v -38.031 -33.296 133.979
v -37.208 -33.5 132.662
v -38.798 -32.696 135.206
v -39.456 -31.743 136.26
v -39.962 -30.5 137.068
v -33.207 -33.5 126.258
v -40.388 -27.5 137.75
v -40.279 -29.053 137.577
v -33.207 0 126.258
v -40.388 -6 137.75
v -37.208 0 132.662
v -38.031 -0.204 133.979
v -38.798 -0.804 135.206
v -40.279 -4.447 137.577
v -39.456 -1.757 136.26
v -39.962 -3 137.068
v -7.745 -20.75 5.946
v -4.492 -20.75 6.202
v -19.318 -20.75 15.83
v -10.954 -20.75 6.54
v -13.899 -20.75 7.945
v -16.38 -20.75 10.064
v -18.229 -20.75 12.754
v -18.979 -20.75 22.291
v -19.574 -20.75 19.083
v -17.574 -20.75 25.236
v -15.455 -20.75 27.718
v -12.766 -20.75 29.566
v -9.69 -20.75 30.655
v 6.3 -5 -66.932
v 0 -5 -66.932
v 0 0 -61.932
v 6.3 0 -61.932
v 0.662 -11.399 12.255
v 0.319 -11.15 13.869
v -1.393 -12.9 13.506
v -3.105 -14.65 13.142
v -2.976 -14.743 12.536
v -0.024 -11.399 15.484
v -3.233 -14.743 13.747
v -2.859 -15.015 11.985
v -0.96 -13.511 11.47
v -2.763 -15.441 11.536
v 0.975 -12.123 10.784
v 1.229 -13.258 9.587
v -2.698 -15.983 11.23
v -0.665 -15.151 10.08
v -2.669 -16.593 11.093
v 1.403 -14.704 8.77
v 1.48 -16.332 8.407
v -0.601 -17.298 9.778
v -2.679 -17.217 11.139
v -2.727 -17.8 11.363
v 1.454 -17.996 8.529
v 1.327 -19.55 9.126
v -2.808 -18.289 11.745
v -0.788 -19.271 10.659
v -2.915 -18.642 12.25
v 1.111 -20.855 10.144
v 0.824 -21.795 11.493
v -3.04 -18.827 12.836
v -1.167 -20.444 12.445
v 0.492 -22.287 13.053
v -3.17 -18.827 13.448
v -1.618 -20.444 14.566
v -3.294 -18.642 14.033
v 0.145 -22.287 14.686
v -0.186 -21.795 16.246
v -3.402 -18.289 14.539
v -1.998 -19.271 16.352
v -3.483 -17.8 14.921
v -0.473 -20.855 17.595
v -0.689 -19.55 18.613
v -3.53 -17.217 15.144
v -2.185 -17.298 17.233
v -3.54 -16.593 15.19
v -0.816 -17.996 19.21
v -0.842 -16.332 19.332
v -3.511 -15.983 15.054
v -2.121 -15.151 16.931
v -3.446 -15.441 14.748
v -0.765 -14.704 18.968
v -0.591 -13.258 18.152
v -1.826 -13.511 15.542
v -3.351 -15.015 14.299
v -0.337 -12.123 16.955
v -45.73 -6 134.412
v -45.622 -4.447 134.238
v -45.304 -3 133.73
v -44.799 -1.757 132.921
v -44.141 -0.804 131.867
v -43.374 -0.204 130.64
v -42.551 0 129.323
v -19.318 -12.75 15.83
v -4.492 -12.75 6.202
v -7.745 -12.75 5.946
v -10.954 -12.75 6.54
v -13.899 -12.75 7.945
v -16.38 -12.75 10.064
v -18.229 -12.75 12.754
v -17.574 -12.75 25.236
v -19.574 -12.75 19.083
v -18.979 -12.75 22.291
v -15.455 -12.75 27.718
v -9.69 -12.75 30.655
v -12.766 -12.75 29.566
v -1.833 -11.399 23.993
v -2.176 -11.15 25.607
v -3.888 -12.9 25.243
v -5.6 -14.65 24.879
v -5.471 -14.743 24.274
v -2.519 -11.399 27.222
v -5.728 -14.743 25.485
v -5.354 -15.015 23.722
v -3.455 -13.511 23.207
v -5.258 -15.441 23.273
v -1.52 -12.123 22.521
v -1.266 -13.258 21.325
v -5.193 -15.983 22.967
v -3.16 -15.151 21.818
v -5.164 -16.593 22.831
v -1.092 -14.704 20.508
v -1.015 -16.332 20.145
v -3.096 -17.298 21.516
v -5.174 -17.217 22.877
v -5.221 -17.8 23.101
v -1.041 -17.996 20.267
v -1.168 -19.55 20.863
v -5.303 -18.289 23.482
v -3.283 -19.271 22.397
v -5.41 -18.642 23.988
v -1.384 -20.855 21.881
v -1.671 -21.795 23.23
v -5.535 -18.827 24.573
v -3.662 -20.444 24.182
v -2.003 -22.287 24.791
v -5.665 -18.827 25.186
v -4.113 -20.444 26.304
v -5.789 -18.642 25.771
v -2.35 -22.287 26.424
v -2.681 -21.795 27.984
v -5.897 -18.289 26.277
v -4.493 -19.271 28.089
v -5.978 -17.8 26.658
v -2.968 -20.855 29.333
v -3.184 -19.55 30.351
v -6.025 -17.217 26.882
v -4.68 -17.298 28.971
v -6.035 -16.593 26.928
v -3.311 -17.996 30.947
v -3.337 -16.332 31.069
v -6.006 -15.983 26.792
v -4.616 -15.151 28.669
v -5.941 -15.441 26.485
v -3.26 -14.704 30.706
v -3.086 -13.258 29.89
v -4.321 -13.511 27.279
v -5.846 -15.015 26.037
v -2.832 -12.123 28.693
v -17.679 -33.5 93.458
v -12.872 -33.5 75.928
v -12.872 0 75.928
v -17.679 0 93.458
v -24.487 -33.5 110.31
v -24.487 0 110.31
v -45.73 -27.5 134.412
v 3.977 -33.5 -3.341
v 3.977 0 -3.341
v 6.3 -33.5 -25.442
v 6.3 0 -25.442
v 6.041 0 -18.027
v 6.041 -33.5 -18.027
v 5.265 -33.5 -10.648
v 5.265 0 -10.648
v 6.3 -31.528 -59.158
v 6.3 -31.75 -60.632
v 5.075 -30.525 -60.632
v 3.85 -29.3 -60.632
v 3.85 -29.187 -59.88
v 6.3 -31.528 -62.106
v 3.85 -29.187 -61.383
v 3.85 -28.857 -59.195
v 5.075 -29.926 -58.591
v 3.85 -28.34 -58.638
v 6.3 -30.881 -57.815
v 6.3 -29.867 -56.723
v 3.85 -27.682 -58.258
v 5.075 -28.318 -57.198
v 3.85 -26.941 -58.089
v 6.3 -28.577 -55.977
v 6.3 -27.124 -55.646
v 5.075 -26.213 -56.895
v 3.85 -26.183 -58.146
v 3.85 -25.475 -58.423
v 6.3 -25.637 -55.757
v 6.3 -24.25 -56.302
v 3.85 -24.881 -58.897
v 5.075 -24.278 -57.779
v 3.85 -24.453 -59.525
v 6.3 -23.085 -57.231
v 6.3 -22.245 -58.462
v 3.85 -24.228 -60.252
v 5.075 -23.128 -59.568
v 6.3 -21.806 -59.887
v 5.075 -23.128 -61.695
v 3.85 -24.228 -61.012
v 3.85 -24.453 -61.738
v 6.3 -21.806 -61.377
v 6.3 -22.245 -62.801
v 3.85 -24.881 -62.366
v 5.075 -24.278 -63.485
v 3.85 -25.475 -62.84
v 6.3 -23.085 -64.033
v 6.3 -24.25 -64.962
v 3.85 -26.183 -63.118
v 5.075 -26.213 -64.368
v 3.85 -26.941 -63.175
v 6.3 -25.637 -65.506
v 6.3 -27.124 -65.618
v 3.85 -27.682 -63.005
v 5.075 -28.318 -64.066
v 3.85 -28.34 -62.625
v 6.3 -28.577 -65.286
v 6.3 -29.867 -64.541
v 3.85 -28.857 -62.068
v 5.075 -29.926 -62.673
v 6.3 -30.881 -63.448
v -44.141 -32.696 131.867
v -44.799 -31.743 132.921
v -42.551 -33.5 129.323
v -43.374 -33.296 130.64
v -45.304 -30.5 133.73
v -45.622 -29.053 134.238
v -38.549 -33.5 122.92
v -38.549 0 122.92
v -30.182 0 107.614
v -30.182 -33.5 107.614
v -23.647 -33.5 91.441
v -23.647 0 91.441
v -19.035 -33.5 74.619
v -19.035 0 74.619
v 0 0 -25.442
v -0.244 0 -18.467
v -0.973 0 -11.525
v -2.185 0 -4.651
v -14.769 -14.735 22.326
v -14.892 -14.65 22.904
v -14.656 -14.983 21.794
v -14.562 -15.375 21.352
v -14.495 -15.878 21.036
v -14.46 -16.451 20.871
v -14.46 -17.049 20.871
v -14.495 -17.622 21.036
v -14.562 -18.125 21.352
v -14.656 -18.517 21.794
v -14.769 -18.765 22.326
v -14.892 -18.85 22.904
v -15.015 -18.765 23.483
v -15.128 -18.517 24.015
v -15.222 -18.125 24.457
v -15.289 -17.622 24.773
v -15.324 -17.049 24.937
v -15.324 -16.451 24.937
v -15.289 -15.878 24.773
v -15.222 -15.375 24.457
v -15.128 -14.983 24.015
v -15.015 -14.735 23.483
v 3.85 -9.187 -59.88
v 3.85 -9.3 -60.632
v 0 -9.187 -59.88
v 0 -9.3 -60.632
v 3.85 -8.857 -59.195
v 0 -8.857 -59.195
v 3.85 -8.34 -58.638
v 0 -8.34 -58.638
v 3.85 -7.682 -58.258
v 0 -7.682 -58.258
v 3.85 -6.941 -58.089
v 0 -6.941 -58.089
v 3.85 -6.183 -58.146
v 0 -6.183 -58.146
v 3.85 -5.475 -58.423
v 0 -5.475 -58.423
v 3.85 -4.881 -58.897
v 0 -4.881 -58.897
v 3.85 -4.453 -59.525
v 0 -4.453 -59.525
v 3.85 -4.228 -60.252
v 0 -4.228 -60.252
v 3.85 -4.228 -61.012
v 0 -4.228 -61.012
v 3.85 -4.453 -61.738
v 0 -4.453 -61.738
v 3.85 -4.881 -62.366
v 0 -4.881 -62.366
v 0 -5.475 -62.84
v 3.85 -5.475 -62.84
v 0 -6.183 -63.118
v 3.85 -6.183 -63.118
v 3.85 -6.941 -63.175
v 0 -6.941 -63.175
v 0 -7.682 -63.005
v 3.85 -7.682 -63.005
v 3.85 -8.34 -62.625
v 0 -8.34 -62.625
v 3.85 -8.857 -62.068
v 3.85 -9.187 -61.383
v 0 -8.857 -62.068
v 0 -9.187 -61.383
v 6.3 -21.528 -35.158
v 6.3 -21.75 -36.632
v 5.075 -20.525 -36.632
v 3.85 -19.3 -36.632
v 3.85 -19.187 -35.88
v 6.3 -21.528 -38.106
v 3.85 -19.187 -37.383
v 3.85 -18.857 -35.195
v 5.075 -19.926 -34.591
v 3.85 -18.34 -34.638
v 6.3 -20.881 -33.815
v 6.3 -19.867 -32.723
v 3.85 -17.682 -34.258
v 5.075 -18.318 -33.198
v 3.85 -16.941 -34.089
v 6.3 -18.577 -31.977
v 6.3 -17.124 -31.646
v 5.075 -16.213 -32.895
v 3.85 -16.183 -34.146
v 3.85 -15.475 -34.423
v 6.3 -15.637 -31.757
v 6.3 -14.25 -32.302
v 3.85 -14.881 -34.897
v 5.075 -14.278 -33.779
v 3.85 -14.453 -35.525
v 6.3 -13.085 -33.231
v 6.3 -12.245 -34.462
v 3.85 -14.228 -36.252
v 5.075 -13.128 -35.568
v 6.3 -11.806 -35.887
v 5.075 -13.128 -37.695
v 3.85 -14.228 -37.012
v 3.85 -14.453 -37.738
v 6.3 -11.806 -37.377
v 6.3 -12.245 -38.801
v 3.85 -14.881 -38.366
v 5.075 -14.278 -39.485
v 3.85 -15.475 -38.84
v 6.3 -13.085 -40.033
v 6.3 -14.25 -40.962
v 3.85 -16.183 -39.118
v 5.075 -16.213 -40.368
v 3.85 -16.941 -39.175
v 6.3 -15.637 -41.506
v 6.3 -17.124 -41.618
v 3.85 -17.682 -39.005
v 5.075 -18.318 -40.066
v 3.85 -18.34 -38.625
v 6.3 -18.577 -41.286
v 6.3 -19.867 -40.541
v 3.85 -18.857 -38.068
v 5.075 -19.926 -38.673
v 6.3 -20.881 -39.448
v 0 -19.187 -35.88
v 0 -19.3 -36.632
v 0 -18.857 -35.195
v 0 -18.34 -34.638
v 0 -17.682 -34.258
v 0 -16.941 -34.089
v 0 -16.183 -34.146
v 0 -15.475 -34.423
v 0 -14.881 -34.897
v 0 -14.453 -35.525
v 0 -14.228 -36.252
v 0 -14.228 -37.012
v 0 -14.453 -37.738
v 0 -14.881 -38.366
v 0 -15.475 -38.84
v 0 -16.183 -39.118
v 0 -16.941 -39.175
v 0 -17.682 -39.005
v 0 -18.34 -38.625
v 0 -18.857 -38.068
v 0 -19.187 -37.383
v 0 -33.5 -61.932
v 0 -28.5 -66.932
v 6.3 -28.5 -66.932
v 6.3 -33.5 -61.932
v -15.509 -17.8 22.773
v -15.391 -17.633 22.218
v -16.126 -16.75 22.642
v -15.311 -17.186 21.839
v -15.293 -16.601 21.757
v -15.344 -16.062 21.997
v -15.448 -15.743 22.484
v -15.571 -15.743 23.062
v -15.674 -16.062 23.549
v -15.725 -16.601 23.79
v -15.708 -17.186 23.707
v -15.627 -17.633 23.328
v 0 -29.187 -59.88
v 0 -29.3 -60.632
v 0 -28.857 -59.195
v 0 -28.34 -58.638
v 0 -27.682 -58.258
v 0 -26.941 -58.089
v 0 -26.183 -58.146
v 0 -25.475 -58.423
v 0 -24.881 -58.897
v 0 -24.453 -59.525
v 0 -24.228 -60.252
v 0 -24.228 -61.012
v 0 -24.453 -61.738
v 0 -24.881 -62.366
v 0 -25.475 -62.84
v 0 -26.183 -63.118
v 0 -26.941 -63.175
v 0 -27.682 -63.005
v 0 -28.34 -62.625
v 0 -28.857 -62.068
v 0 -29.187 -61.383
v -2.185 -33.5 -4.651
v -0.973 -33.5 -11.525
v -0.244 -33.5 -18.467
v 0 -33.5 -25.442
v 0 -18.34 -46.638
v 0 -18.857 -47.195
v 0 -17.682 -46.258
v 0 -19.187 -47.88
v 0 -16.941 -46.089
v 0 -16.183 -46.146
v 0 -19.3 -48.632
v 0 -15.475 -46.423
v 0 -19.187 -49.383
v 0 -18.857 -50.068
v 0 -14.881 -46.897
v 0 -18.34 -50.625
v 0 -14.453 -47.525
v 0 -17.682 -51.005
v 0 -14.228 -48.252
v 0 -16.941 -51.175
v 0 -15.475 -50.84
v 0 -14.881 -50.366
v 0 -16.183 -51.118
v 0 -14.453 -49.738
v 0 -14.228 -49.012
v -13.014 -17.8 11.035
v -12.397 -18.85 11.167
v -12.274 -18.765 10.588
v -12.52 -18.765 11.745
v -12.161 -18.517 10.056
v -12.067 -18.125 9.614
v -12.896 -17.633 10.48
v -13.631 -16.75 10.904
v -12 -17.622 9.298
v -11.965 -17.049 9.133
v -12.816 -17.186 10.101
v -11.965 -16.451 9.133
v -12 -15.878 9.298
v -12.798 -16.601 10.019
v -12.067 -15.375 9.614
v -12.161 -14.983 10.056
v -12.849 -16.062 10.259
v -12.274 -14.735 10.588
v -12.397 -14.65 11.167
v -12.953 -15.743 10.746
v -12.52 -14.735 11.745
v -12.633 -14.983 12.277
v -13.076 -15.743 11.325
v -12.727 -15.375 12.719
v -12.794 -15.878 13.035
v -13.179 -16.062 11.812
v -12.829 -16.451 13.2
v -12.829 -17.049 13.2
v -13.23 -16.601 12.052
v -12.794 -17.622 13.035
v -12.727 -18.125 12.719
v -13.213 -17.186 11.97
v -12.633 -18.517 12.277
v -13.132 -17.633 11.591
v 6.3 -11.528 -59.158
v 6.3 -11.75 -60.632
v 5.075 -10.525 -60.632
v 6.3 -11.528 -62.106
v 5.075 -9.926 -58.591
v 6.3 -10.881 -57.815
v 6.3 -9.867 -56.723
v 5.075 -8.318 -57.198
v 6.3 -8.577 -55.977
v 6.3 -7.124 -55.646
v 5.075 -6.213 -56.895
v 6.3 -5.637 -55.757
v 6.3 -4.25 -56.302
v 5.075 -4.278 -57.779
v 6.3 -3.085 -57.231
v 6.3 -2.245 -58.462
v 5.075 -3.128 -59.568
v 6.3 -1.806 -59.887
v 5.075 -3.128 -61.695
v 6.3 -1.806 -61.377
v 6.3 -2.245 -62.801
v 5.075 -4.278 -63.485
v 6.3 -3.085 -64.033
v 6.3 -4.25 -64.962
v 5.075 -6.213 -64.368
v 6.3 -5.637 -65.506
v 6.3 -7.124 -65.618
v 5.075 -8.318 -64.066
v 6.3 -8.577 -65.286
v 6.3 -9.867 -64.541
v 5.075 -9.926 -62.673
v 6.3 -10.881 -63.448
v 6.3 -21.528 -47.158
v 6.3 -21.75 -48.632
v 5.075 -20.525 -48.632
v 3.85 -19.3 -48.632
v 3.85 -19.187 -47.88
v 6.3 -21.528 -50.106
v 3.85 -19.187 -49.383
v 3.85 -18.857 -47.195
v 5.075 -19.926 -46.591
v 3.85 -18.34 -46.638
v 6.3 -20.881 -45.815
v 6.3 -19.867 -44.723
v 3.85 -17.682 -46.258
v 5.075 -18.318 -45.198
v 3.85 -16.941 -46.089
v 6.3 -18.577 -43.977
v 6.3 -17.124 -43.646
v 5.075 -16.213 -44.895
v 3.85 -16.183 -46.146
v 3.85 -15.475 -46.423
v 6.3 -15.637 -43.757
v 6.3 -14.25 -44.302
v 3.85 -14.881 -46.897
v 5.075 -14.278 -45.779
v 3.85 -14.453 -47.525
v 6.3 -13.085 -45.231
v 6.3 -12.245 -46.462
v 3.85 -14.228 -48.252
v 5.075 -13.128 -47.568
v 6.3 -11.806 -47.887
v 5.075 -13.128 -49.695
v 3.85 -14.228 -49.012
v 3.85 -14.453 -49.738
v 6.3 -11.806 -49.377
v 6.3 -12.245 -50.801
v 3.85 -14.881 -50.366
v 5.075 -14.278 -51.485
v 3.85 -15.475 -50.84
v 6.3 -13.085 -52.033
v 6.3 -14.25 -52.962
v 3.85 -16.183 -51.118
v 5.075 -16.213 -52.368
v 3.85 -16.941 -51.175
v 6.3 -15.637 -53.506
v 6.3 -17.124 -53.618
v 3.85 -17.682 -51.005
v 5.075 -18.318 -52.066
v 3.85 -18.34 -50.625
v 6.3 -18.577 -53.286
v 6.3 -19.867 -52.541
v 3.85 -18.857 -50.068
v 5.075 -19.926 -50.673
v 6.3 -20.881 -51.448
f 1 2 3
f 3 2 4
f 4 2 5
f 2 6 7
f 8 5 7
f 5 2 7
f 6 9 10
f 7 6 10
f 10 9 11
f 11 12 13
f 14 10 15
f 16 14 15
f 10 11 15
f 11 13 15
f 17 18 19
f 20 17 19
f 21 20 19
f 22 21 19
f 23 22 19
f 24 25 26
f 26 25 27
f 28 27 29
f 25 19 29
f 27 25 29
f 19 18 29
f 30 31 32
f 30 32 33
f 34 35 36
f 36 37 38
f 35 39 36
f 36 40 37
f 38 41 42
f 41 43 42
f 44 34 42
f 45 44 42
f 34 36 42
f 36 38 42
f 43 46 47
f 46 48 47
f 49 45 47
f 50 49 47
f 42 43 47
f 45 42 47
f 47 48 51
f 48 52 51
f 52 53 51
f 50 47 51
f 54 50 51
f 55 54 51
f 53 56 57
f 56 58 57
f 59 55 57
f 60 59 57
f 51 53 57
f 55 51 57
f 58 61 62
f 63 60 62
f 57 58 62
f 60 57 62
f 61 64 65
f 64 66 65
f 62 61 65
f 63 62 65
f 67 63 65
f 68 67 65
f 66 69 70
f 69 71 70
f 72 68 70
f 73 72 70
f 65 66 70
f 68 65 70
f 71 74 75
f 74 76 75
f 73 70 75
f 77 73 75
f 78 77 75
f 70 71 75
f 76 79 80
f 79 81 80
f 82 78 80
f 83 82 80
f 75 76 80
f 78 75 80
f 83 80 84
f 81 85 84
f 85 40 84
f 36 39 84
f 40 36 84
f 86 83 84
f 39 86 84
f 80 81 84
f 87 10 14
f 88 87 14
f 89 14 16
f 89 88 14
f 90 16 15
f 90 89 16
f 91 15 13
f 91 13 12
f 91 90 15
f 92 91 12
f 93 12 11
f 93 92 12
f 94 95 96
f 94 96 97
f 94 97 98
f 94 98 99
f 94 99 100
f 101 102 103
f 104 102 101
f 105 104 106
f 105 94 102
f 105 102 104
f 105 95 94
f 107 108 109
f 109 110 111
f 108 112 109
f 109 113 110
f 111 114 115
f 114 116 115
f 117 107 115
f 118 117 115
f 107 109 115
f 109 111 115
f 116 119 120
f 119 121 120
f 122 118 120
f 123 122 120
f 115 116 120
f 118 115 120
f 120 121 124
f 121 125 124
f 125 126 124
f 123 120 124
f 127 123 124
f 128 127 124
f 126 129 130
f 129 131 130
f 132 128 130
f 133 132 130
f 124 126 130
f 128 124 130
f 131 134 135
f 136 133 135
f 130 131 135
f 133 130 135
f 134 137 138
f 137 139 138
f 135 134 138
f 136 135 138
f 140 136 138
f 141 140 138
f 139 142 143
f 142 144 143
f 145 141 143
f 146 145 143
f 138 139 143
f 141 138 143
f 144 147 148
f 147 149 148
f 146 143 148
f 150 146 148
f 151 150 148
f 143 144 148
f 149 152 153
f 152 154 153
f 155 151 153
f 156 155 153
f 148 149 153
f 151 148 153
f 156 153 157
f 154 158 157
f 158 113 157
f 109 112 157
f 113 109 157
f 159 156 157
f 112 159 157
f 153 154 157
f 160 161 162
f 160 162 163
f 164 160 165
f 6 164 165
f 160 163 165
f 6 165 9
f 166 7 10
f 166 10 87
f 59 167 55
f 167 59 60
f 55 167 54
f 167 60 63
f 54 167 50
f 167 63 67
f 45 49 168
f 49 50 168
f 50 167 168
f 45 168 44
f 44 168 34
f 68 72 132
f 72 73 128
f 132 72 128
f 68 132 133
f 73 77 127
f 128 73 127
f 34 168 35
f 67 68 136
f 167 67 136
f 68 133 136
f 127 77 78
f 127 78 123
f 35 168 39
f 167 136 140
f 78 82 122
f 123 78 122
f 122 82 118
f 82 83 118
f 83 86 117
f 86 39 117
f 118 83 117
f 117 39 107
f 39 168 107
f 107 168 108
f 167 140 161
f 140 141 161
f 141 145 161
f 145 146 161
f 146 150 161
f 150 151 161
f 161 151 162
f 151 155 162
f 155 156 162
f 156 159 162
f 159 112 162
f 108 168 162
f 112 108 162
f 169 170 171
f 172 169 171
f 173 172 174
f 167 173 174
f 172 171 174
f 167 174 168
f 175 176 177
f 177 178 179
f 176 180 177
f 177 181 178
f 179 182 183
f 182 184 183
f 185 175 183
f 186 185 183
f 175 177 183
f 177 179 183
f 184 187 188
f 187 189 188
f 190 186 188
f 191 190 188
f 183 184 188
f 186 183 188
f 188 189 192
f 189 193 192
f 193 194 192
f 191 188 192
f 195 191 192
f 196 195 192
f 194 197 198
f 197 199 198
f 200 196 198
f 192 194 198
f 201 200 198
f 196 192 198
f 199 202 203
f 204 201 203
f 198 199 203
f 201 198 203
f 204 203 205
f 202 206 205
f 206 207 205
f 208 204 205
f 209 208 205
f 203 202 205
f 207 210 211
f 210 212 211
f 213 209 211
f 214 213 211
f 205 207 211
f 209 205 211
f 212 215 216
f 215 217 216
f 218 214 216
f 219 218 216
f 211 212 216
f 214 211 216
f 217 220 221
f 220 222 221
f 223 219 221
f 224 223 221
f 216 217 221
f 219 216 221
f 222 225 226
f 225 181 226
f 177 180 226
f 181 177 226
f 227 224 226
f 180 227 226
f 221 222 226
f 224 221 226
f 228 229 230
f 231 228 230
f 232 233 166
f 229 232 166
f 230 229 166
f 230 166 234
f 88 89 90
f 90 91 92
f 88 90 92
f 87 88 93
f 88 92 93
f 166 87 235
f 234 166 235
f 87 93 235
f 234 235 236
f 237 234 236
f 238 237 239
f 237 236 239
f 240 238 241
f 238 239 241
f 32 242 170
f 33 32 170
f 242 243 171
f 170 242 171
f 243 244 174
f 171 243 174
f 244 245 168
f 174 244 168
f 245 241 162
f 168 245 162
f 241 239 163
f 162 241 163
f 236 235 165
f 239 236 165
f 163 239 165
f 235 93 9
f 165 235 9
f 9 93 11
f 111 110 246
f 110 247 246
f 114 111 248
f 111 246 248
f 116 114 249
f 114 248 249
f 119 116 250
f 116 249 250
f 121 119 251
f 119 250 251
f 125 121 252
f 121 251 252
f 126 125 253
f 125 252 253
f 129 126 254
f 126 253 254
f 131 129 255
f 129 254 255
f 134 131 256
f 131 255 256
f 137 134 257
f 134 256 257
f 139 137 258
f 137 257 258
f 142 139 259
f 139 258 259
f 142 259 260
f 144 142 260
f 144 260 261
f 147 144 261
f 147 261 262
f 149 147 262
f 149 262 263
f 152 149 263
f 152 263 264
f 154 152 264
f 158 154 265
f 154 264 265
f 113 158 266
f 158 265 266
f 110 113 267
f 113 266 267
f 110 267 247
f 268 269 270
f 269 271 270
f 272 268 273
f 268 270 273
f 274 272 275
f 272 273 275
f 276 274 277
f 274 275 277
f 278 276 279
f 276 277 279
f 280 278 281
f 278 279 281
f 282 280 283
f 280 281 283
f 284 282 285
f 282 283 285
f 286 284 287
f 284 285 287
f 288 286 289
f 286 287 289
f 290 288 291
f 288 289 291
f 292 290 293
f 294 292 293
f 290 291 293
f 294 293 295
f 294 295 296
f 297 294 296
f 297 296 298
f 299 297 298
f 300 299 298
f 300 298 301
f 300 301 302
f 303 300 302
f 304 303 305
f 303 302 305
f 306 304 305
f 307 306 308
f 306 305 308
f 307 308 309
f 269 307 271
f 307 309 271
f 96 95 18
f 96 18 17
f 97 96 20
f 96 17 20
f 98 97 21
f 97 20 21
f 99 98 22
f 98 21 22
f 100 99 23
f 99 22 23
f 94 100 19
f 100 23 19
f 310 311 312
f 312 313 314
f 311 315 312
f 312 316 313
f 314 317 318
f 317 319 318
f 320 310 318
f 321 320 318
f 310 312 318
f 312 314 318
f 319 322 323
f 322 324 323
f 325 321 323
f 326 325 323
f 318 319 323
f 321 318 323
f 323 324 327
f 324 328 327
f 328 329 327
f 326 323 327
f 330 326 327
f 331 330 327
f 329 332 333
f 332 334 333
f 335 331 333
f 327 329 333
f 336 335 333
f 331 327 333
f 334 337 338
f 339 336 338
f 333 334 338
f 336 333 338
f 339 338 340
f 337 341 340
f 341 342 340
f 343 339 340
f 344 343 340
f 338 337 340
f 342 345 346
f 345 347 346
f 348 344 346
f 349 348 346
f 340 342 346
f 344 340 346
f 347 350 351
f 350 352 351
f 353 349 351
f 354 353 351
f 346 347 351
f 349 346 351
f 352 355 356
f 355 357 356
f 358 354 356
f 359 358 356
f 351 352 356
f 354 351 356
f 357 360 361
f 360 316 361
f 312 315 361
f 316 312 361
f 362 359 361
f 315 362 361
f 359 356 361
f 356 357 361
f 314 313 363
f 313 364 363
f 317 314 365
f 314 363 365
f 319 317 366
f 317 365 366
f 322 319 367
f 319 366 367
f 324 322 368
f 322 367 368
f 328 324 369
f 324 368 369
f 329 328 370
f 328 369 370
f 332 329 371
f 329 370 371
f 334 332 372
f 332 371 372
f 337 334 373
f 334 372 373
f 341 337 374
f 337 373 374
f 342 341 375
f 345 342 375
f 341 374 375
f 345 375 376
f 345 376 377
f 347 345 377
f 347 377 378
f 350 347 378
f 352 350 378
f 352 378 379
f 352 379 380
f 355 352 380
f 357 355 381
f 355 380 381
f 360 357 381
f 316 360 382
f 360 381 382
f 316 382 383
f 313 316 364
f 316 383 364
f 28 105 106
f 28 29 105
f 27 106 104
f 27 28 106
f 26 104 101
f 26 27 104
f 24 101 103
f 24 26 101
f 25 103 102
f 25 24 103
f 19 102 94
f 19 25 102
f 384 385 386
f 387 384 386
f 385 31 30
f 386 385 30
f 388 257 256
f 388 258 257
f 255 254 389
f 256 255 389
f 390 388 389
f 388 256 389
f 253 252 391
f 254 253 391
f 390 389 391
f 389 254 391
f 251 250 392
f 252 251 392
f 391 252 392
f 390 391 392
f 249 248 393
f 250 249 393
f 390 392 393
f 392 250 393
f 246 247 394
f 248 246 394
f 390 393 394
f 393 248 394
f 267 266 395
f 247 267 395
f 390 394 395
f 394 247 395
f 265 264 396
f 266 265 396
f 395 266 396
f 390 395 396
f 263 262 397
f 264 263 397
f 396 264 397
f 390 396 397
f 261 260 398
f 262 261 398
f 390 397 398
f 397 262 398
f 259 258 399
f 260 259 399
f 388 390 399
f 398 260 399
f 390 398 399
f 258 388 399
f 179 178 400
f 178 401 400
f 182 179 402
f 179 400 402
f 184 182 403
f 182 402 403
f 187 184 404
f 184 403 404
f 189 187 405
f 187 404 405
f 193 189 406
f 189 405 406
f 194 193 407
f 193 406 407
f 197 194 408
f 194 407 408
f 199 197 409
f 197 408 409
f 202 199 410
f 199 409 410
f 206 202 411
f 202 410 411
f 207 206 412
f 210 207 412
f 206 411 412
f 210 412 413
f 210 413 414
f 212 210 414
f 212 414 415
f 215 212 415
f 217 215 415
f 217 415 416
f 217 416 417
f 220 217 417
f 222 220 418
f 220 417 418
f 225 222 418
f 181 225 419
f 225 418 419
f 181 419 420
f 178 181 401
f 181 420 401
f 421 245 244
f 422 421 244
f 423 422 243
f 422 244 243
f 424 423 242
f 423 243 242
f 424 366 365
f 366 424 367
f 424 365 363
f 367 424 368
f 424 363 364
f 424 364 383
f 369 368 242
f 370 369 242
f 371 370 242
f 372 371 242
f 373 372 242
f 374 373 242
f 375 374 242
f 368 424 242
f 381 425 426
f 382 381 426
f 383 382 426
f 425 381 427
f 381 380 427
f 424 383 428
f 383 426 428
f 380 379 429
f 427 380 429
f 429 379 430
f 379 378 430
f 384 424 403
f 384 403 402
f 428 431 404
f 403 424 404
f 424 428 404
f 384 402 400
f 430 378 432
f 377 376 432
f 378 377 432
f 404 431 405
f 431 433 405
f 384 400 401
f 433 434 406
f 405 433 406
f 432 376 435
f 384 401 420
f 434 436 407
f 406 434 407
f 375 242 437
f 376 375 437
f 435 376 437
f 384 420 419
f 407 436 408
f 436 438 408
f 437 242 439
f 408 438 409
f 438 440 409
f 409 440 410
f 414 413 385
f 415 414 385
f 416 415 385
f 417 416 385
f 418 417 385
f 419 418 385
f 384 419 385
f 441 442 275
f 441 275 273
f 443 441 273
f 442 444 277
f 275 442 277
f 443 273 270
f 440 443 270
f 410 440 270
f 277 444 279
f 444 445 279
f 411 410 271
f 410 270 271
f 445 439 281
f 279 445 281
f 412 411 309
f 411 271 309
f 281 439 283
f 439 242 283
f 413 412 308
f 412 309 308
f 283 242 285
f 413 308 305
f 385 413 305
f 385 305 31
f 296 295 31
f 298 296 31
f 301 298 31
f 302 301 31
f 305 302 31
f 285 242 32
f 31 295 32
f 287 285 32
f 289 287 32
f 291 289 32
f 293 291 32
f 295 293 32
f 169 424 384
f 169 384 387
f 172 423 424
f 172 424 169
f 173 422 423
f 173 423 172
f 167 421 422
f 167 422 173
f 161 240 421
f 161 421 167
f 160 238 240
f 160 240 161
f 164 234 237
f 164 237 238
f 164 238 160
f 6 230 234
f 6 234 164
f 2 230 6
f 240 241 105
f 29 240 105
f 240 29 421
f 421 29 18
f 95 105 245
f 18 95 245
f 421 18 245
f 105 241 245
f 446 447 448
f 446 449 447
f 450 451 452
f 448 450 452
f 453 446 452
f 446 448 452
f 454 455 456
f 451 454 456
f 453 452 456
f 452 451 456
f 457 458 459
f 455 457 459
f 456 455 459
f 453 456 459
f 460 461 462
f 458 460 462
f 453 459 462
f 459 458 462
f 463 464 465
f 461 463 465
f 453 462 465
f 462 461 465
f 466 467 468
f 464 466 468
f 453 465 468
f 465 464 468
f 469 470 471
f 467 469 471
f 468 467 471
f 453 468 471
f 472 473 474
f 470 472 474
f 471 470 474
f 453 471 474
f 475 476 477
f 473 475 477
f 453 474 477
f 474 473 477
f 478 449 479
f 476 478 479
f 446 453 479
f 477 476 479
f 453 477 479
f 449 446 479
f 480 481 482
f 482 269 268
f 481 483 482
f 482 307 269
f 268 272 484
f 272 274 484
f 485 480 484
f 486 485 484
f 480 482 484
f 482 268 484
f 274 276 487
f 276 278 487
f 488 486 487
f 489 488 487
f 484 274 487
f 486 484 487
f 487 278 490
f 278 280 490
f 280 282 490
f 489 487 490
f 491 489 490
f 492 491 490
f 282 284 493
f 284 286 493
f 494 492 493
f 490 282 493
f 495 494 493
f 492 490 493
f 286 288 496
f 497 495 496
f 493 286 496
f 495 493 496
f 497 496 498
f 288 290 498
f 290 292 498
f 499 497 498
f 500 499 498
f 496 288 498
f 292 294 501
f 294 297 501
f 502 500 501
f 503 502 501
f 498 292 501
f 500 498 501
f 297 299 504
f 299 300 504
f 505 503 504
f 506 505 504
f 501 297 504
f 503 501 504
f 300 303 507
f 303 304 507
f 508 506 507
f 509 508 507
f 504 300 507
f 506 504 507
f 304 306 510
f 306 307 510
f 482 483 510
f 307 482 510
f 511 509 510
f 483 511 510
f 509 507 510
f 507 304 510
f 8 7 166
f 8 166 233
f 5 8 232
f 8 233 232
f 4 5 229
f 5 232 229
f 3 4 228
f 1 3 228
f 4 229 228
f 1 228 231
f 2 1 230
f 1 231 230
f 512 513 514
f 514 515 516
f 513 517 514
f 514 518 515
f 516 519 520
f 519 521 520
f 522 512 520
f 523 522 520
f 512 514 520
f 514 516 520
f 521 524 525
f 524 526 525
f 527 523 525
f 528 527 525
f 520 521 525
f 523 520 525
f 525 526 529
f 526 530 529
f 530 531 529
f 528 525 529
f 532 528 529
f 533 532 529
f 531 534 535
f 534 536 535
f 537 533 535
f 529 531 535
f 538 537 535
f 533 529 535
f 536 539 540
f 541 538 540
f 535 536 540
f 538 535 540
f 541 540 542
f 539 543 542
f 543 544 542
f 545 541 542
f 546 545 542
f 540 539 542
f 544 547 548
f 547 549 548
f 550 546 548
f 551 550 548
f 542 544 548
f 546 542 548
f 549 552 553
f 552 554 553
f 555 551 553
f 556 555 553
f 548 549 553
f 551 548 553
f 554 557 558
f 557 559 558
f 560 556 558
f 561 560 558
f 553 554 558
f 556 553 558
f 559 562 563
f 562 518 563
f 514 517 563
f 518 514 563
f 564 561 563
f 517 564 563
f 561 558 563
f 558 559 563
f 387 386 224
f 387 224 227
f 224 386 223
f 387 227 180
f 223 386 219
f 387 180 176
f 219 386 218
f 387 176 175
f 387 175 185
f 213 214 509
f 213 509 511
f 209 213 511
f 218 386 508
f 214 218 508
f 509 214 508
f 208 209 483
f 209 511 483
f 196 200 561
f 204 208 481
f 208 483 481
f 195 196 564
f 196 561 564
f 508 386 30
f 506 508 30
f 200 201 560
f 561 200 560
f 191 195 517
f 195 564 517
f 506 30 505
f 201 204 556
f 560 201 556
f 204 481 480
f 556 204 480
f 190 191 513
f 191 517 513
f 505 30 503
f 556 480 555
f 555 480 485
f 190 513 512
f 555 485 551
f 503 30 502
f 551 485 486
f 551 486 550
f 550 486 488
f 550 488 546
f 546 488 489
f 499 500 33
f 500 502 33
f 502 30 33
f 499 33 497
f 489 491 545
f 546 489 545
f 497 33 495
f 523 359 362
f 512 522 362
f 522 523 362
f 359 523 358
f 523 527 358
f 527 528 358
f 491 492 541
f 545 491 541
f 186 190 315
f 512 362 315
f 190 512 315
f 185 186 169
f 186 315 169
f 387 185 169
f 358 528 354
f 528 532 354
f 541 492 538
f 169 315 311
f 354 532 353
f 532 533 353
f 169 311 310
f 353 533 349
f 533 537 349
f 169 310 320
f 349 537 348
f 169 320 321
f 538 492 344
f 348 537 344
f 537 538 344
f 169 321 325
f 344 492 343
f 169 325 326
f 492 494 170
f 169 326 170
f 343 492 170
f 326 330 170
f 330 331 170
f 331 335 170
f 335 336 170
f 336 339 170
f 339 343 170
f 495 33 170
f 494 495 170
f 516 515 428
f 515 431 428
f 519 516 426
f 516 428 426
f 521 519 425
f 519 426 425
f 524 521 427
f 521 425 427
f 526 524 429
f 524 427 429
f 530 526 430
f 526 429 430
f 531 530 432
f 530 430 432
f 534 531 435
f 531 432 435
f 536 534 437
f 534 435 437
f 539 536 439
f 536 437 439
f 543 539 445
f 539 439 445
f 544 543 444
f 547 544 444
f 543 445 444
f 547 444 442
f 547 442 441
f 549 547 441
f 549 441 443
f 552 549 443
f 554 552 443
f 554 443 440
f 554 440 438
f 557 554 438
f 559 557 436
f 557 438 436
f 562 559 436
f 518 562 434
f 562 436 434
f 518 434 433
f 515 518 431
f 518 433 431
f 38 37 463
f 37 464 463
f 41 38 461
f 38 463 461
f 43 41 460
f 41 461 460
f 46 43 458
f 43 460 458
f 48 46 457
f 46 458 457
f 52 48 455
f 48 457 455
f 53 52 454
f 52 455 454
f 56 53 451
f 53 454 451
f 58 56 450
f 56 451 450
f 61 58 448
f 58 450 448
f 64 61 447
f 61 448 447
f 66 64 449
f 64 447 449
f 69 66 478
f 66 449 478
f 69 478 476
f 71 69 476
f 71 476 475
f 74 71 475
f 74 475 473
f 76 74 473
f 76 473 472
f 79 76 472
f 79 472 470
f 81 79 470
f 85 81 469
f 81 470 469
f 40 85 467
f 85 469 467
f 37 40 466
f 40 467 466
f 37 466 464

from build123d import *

# Parameters (mm, degrees)
F1_DEPTH        = 33.5
F2_R            = 6
F5_SIZE         = 5
F6_D            = 5.1
F6_CSINK_D      = 10
F6_CSINK_ANGLE  = 90
F7_W            = 8
F7_H            = 25
F8_DEPTH        = 12.5
F9_R            = 12.49999
F12_D           = 4.2
F12_DEPTH       = 13
F12_CSINK_D     = 11.2
F12_CSINK_ANGLE = 90
F12_TIP         = 1.2618073


# Not quite as in the source:
# - a fillet or chamfer is up to 0.001 mm smaller than in the source, because OpenCascade refuses the exact size


with BuildPart() as f1:
    # F0 (on Front) → F1 (new body)
    with BuildSketch(Plane.XZ):
        with BuildLine():
            Line((0, -25.4421804936), (0, -66.931756967))
            Line((0, -66.931756967), (6.3, -66.931756967))
            Line((6.3, -66.931756967), (6.3, -25.4421804936))
            ThreePointArc((6.3, -25.4421804936), (5.7176774776, -14.3308048482), (3.977089958, -3.3411677597))
            Line((3.977089958, -3.3411677597), (-12.8721835275, 75.928431603))
            ThreePointArc((-12.8721835275, 75.928431603), (-20.8378170534, 101.9828448791), (-33.2067360929, 126.2582153279))
            Line((-33.2067360929, 126.2582153279), (-40.38764708, 137.7500751305))
            Line((-40.38764708, 137.7500751305), (-45.7303500858, 134.4115837658))
            Line((-45.7303500858, 134.4115837658), (-38.5494390987, 122.9197239632))
            ThreePointArc((-38.5494390987, 122.9197239632), (-26.6790753372, 99.6228233406), (-19.0345134121, 74.6185879509))
            Line((-19.0345134121, 74.6185879509), (-2.1852399266, -4.6510114118))
            ThreePointArc((-2.1852399266, -4.6510114118), (-0.5478104632, -14.9893341668), (0, -25.4421804936))
        make_face()
    extrude(amount=F1_DEPTH)

    # F2
    f2_edges = [f1.edges().sort_by_distance(p)[0] for p in [
        (-43.058999, -33.5, 136.080829),
        (-43.058999, 0, 136.080829),
    ]]
    fillet(f2_edges, radius=F2_R)

    # F5
    f5_edges = [f1.edges().sort_by_distance(p)[0] for p in [
        (3.15, -33.5, -66.931757),
        (3.15, 0, -66.931757),
    ]]
    chamfer(f5_edges, length=F5_SIZE)

    # F6 (through all)
    with Locations(Plane.YZ.offset(6.3)):
        with Locations((-16.75, -36.631756967), (-16.75, -48.631756967), (-26.75, -60.631756967), (-6.75, -60.631756967)):
            CounterSinkHole(F6_D / 2, F6_CSINK_D / 2, counter_sink_angle=F6_CSINK_ANGLE)

    # F7 (on face) → F8 (join)
    with BuildSketch(Plane(origin=(-3.036646352, 0, -0.6454591076), x_dir=(0, -1, 0), z_dir=(-0.9781476007, 0, -0.2079116908))):
        with Locations((16.75, 19.5)):
            Rectangle(F7_W, F7_H)
    extrude(amount=F8_DEPTH)

    # F9 (radius 12.5 in the source; OpenCascade refuses exactly that, so slightly less here)
    f9_edges = [f1.edges().sort_by_distance(p)[0] for p in [
        (-16.718873, -16.75, 3.602678),
        (-21.916665, -16.75, 28.056368),
    ]]
    fillet(f9_edges, radius=F9_R)

    # F12
    with Locations(Plane(origin=(3.1256835326, 0, 0.6643845446), x_dir=(0, -1, 0), z_dir=(0.9781476007, 0, 0.2079116908))):
        with Locations((16.75, -25.5), (16.75, -13.5)):
            CounterSinkHole(F12_D / 2, F12_CSINK_D / 2, depth=F12_DEPTH, counter_sink_angle=F12_CSINK_ANGLE)
            with Locations((0, 0, -(F12_DEPTH + F12_TIP / 2))):  # 118° drill point
                Cone(0, F12_D / 2, F12_TIP, mode=Mode.SUBTRACT)


solid = f1.part
